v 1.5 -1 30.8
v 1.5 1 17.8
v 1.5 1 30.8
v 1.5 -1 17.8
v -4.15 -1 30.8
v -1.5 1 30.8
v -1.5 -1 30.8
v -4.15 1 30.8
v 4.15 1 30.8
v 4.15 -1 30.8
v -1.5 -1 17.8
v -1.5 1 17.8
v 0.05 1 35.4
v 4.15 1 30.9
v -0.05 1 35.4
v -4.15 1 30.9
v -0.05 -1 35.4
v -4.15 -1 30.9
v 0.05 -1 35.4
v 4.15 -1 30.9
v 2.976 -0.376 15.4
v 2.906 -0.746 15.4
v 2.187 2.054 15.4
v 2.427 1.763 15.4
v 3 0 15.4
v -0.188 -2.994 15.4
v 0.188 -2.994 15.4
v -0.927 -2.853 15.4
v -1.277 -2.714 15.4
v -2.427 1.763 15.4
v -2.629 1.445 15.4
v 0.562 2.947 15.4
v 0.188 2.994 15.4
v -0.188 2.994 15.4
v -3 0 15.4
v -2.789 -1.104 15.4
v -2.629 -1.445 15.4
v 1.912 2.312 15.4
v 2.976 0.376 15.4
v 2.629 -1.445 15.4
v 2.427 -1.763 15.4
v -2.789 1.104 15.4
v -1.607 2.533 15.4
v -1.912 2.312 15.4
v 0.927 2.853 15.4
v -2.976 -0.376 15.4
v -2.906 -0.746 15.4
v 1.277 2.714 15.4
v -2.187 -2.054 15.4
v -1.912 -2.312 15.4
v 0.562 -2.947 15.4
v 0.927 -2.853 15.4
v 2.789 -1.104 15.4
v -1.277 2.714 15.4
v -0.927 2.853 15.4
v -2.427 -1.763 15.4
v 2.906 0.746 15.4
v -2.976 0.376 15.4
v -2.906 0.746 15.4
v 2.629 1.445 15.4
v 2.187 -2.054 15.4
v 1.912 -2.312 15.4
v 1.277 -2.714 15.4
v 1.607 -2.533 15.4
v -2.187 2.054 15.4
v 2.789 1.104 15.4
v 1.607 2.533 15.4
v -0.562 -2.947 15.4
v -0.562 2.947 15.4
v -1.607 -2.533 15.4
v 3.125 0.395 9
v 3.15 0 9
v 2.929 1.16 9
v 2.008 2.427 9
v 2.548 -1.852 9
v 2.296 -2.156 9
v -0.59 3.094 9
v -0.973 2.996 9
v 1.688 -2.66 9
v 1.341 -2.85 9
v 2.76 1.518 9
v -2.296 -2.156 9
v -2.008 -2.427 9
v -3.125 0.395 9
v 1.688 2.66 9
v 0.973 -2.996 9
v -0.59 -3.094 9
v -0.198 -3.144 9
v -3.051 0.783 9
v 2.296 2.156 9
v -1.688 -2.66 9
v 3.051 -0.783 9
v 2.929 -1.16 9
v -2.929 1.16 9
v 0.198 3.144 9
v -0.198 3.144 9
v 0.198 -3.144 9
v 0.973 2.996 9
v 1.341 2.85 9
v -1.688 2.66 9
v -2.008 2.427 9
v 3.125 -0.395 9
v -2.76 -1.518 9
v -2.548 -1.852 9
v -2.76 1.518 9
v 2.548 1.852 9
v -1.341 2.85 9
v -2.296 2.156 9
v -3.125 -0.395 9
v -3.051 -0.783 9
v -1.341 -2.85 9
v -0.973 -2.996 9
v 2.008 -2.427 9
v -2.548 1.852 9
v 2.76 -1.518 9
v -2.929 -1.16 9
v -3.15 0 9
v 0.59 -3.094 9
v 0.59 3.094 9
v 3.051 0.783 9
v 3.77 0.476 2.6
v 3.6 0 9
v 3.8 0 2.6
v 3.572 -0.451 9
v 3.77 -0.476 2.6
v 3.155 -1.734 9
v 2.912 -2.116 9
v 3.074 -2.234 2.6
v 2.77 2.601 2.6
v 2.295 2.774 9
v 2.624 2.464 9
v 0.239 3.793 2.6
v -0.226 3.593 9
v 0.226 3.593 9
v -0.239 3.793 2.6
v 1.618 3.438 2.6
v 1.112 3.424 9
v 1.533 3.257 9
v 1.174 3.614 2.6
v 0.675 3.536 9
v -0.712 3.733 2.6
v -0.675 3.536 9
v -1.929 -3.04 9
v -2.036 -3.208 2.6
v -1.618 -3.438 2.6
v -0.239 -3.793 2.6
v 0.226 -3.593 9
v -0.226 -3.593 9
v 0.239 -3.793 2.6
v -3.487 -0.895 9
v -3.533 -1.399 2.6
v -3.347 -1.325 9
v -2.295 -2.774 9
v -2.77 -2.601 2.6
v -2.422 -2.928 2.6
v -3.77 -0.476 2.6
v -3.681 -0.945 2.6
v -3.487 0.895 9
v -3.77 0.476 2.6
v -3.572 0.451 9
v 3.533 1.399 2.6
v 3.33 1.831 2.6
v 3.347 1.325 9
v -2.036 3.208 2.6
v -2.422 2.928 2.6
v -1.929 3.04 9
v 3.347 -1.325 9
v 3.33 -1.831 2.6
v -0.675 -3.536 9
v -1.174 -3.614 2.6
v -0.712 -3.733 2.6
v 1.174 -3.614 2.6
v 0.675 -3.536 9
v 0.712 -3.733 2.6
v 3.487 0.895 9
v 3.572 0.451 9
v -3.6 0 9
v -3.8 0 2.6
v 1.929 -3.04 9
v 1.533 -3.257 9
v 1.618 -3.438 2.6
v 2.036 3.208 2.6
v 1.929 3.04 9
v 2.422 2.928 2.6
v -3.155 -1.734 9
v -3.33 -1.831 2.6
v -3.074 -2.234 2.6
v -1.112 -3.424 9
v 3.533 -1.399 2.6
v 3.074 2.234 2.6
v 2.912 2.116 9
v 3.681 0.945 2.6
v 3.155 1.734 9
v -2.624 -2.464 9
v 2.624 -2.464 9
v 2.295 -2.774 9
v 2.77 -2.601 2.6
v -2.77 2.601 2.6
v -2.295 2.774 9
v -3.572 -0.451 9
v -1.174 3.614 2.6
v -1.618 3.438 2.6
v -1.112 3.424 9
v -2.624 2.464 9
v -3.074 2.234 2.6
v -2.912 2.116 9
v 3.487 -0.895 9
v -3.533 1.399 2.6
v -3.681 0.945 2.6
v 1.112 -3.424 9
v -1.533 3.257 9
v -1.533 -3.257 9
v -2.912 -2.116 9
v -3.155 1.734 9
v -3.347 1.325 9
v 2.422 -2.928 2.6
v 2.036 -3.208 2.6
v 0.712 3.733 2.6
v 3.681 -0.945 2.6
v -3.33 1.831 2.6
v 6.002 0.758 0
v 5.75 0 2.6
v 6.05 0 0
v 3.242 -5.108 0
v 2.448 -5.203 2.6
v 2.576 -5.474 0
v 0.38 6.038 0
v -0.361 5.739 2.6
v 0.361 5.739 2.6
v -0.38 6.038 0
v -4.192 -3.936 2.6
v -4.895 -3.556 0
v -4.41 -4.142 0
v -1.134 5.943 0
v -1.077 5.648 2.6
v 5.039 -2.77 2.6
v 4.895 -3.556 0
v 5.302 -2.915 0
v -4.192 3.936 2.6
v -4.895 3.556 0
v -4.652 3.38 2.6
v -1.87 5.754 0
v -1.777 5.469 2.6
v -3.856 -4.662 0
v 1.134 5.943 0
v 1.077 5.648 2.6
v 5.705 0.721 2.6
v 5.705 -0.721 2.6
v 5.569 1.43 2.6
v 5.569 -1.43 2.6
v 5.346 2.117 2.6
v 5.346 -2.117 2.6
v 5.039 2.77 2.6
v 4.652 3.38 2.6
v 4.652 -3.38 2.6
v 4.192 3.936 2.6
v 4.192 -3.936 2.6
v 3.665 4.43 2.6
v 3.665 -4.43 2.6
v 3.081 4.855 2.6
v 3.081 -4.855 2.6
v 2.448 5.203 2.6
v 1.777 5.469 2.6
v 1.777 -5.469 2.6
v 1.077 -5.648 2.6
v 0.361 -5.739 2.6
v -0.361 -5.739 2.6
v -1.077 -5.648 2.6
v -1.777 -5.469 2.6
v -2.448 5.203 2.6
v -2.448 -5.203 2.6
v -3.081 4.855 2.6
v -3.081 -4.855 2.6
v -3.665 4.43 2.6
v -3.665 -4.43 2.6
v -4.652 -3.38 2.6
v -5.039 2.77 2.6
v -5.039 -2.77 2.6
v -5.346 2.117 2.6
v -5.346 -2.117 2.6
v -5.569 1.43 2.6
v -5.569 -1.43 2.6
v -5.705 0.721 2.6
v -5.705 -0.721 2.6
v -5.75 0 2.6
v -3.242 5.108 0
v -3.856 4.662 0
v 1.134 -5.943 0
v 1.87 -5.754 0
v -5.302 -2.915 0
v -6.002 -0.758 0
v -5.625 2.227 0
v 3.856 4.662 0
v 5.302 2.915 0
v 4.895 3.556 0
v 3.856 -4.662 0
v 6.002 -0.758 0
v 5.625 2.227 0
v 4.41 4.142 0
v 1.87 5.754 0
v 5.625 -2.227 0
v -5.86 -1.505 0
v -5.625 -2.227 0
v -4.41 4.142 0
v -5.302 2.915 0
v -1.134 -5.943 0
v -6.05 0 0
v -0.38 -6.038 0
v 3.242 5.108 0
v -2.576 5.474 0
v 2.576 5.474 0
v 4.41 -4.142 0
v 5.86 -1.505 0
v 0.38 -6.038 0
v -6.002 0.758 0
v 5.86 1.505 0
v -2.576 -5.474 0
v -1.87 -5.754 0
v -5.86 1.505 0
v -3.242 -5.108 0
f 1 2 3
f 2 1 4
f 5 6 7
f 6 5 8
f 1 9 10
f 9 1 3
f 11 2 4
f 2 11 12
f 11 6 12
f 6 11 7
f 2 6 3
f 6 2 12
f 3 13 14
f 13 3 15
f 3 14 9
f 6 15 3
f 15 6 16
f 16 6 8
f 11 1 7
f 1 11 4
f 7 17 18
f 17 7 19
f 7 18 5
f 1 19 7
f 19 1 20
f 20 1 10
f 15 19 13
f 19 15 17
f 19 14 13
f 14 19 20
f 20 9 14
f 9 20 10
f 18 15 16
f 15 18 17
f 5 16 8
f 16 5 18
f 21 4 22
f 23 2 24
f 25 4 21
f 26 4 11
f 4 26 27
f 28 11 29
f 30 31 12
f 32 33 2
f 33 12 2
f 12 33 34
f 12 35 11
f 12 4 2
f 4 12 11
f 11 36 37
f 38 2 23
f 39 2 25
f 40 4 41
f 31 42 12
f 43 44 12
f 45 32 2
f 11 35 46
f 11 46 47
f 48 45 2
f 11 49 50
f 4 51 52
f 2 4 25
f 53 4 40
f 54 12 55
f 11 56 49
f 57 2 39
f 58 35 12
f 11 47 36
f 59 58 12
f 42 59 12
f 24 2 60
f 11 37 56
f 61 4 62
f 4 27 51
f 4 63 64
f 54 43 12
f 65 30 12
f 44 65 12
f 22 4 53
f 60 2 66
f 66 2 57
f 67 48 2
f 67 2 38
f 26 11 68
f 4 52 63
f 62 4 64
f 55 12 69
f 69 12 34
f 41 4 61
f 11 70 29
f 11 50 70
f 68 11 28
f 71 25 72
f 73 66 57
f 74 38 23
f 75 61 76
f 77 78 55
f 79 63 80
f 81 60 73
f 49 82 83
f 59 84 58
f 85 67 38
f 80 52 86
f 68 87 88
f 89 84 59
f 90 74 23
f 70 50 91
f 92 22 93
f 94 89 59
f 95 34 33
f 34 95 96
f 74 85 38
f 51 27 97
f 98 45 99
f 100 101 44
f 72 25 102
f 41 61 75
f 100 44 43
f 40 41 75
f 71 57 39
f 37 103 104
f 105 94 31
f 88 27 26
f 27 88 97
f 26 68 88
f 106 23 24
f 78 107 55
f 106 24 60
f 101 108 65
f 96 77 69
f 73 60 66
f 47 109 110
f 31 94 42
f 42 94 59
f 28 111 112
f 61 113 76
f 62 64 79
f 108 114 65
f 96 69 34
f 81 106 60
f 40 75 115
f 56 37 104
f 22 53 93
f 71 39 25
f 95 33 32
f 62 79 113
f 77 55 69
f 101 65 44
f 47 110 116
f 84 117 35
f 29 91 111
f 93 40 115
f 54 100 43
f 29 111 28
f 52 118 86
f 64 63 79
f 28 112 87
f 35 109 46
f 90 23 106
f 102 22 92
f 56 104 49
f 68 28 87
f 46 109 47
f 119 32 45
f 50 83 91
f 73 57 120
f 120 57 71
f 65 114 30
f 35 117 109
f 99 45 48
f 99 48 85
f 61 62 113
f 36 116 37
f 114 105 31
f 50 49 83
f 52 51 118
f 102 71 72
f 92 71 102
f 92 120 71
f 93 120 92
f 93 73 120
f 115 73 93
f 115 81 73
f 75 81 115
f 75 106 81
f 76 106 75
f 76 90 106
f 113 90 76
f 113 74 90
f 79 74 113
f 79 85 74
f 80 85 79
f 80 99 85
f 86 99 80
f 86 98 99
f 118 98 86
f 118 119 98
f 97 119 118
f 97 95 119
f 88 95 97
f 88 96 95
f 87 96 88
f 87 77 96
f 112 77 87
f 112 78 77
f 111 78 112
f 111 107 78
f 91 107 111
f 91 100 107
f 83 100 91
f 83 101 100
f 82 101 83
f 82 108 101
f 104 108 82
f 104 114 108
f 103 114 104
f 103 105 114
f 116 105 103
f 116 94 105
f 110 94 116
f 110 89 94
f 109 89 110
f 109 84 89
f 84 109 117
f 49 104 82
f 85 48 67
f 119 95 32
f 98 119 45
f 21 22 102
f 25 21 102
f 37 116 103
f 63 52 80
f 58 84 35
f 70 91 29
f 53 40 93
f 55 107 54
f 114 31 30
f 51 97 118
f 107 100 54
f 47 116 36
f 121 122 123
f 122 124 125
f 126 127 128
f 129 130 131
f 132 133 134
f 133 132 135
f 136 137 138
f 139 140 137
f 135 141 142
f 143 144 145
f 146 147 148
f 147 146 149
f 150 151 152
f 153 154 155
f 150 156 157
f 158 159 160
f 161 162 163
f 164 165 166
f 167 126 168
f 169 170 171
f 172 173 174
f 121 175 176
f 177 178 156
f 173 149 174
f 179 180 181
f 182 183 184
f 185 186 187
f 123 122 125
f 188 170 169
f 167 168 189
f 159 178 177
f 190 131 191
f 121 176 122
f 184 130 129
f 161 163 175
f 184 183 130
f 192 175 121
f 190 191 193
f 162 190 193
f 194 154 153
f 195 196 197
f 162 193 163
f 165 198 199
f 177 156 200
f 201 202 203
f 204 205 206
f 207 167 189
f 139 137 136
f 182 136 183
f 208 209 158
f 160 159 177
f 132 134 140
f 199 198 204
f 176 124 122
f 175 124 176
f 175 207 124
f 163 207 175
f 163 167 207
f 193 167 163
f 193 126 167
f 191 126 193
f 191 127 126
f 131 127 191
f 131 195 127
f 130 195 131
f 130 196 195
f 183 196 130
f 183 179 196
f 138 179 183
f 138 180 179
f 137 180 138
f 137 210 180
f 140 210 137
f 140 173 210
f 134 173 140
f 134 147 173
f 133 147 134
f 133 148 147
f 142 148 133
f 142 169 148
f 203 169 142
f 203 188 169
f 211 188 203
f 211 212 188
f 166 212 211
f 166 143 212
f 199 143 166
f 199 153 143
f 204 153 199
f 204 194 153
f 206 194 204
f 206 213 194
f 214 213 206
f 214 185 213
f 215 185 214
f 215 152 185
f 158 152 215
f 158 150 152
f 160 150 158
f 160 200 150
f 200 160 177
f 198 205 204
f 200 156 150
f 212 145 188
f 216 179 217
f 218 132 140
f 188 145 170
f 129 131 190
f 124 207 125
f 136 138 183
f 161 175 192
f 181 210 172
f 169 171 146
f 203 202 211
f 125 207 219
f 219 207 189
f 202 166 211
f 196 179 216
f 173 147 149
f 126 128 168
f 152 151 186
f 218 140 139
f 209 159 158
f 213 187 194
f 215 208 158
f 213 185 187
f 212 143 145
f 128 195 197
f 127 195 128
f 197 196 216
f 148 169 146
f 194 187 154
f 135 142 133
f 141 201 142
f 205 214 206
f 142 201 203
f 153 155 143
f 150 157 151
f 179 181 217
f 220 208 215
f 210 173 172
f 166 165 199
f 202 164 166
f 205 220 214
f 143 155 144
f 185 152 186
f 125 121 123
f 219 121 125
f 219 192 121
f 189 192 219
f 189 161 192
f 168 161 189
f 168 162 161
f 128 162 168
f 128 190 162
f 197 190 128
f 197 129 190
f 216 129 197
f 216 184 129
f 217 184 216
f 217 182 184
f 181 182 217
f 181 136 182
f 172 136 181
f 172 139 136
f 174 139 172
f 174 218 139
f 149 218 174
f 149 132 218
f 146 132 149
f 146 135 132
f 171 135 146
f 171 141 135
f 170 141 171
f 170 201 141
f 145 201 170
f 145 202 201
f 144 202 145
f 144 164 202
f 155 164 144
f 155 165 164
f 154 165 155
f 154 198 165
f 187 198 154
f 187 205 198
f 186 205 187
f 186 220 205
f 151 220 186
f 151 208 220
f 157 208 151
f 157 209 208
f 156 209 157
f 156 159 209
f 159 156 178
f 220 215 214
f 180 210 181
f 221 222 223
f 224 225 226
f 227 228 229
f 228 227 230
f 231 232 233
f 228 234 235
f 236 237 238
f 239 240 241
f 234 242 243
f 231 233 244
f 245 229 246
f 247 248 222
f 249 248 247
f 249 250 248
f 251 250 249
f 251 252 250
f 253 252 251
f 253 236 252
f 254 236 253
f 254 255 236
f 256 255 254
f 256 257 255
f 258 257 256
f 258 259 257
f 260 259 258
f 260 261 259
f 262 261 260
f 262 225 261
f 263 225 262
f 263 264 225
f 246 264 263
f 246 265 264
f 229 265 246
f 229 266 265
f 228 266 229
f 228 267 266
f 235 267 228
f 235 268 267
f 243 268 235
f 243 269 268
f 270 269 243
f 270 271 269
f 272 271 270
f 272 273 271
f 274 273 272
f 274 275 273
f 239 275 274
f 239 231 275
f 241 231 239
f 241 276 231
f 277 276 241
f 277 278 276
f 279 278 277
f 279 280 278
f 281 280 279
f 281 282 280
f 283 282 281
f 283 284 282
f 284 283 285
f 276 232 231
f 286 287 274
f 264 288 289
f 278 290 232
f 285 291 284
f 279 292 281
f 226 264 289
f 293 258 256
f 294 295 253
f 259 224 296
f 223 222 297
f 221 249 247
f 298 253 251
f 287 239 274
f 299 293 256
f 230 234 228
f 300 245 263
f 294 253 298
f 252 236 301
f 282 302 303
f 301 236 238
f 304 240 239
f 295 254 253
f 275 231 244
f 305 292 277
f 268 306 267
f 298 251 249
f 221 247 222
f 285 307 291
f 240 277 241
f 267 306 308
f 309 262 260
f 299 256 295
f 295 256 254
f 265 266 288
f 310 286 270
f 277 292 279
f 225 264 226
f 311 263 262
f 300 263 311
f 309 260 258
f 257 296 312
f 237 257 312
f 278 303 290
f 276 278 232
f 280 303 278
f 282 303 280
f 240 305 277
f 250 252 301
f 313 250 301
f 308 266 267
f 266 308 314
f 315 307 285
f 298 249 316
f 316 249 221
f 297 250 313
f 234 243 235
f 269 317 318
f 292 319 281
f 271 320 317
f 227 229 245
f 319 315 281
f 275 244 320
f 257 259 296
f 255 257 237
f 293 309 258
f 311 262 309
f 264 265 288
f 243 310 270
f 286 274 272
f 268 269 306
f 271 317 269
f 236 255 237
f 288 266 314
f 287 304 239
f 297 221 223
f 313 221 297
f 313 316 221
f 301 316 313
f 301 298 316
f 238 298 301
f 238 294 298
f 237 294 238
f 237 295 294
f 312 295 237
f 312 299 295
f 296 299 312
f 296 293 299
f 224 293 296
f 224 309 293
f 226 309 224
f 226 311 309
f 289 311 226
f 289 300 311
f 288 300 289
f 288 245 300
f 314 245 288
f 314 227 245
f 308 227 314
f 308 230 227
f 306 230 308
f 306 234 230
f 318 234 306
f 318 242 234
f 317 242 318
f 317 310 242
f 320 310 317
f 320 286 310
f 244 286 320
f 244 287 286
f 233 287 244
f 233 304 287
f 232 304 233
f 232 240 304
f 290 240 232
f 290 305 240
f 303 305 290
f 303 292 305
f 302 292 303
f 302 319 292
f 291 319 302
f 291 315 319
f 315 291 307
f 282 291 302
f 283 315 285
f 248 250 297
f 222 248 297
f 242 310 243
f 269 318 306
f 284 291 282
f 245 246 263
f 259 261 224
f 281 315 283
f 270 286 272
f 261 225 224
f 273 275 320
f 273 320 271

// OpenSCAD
d = [12.1, 11.5, 7.6, 7.2, 6.3, 6];
h = [2.6, 6.4, 6.4, 2.4, 13, 4.6];
stem = [3, 2, 8.3];
small = 0.1;

$fn = 50;

cylinder(h=h[0], d1=d[0], d2=d[1]);
translate([0, 0, h[0]]) {
  cylinder(h=h[1], d1=d[2], d2=d[3]);
  translate([0, 0, h[1]]) {
    cylinder(h=h[2], d1=d[4], d2=d[5]);
    translate([0, 0, h[2]]) {
      hull() {
        translate([0, 0, -0.1]) cylinder(h=small, d=d[5]);
        translate([-stem[0] / 2, -stem[1] / 2, h[3] - small]) {
          cube([stem[0], stem[1], small]);
        }
      }
      translate([0, -stem[1] / 2, h[3]]) {
        translate([-stem[0] / 2, 0, 0]) {
          cube([stem[0], stem[1], h[4]]);
        }
        translate([-stem[2] / 2, 0, h[4]])
        hull() {
          cube([stem[2], stem[1], small]);
          translate([stem[2] / 2 - small / 2, 0, h[5] - small]) {
            cube([small, stem[1], small]);
          }
        }
      }
    }
  }
}
